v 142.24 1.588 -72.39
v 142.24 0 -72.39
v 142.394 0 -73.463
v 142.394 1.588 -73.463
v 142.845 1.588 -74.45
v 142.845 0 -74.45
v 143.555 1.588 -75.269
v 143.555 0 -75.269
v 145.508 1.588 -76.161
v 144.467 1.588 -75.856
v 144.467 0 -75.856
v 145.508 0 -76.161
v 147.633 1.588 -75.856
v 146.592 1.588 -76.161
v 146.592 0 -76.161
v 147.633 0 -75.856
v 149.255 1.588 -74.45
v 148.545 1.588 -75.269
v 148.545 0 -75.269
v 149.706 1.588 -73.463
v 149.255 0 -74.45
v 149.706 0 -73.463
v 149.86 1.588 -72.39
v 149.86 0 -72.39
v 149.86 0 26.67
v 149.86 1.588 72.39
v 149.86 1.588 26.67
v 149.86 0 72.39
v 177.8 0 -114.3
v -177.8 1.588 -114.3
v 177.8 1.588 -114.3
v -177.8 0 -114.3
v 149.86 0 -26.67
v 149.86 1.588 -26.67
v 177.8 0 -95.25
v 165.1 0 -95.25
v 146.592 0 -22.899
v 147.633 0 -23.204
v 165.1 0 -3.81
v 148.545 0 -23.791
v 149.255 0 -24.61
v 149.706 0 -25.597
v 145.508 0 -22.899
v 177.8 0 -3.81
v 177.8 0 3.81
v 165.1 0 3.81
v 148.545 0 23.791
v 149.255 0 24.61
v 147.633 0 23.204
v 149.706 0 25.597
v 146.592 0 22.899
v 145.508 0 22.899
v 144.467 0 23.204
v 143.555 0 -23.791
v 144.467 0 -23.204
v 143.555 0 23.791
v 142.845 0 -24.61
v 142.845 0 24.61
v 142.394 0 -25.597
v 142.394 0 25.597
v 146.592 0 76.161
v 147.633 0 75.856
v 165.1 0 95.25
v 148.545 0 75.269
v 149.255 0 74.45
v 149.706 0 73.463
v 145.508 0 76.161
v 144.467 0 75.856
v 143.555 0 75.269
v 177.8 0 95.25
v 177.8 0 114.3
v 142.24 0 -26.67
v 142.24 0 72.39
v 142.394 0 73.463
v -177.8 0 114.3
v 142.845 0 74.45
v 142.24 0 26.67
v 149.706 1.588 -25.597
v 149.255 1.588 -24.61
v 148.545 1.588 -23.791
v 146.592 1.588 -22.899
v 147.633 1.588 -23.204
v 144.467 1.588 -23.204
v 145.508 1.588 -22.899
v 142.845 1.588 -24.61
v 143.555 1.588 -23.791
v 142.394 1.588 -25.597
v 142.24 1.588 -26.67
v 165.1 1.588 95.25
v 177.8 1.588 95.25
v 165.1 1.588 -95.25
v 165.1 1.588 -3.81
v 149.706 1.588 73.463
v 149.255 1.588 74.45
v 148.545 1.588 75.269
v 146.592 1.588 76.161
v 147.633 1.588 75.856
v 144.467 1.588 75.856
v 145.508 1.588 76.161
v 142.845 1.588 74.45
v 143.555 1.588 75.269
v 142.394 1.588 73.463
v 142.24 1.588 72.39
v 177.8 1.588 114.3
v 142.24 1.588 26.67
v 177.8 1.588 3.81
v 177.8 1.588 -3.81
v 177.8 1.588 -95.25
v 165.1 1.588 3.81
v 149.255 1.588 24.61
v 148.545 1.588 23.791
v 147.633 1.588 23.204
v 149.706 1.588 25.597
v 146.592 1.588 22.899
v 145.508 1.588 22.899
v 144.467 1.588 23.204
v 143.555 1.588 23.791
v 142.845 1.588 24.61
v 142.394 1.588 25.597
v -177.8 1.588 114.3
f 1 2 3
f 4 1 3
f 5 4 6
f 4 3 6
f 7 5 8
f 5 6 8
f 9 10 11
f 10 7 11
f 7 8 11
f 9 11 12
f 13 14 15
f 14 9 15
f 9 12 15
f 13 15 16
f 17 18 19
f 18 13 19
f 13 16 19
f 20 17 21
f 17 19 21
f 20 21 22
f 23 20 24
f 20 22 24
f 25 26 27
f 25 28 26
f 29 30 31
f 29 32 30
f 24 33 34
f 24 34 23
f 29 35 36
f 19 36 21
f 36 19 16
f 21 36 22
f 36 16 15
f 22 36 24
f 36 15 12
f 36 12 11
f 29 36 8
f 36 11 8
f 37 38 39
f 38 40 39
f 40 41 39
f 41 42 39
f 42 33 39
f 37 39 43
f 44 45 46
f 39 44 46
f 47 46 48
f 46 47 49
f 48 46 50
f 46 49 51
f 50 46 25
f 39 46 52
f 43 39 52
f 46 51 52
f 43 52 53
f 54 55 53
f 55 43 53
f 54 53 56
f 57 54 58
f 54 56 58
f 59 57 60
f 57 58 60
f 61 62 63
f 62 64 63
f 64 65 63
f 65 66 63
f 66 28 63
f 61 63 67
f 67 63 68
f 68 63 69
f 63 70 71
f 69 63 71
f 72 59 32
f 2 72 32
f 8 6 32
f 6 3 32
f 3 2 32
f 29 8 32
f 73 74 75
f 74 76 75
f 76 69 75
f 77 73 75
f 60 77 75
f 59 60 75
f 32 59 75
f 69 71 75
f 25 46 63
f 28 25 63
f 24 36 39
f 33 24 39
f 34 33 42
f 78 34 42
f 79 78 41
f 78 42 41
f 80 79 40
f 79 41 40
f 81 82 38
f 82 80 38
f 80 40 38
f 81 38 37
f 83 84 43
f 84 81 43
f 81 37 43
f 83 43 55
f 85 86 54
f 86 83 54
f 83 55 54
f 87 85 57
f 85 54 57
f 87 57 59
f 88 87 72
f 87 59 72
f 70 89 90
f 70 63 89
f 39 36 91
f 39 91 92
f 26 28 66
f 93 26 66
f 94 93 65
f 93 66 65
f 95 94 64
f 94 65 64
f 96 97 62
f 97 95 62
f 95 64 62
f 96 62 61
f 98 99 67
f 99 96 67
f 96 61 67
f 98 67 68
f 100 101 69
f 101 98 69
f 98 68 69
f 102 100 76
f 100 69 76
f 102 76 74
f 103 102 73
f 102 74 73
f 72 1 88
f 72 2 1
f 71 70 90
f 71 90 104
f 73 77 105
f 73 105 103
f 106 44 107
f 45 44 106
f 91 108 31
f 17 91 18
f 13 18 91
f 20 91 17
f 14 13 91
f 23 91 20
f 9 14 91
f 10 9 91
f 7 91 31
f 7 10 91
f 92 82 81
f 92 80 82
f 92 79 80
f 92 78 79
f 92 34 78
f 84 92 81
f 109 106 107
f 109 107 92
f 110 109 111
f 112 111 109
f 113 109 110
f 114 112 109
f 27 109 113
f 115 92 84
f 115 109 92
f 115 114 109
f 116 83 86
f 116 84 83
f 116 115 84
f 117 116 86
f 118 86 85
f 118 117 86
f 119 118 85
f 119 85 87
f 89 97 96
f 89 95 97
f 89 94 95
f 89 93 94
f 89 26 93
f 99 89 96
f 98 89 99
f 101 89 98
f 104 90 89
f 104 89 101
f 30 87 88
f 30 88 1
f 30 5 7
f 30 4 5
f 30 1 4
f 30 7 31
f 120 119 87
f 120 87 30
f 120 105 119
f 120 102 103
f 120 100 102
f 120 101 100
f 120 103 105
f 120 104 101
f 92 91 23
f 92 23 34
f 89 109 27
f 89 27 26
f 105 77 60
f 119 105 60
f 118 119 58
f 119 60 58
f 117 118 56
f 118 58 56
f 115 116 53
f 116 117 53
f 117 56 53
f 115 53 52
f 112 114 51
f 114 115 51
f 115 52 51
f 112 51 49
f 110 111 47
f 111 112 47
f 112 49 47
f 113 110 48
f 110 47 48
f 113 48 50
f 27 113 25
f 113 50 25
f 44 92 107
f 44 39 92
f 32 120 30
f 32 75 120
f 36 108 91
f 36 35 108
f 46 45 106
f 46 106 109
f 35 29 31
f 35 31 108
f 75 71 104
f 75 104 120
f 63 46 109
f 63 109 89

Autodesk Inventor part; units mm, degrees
ref_plane "YZ Plane" through (0, 0, 0) normal (1, 0, 0) x (0, 1, 0)
ref_plane "XZ Plane" through (0, 0, 0) normal (0, 1, 0) x (-1, 0, 0)
ref_plane "XY Plane" through (0, 0, 0) normal (0, 0, 1) x (1, 0, 0)
sketch "Sketch1" plane through (0, 0, 0) normal (0, 1, 0) x (-1, 0, 0)
  line L0 (-177.8, 114.3) -> (177.8, 114.3)
  line L1 (177.8, 114.3) -> (177.8, -114.3)
  line L2 (177.8, -114.3) -> (-177.8, -114.3)
  line L3 (-177.8, -114.3) -> (-177.8, 114.3)
  line L4 (-177.8, 114.3) -> (177.8, -114.3) construction
  line L5 (177.8, 114.3) -> (-177.8, -114.3) construction
  line L6 (-165.1, 95.25) -> (-177.8, 95.25)
  line L7 (-177.8, 95.25) -> (-177.8, 3.81)
  line L8 (-177.8, 3.81) -> (-165.1, 3.81)
  line L9 (-165.1, 3.81) -> (-165.1, 95.25)
  line L10 (-165.1, -3.81) -> (-177.8, -3.81)
  line L11 (-177.8, -3.81) -> (-177.8, -95.25)
  line L12 (-177.8, -95.25) -> (-165.1, -95.25)
  line L13 (-165.1, -95.25) -> (-165.1, -3.81)
  line L14 (-146.05, 72.39) -> (-146.05, 26.67) construction
  line L15 (-149.86, 72.39) -> (-149.86, 26.67)
  line L16 (-142.24, 26.67) -> (-142.24, 72.39)
  arc A0 (-142.24, 72.39) -> (-149.86, 72.39) centre (-146.05, 72.39) ccw
  arc A1 (-149.86, 26.67) -> (-142.24, 26.67) centre (-146.05, 26.67) ccw
  line L17 (-146.05, -26.67) -> (-146.05, -72.39) construction
  line L18 (-149.86, -26.67) -> (-149.86, -72.39)
  line L19 (-142.24, -72.39) -> (-142.24, -26.67)
  arc A2 (-142.24, -26.67) -> (-149.86, -26.67) centre (-146.05, -26.67) ccw
  arc A3 (-149.86, -72.39) -> (-142.24, -72.39) centre (-146.05, -72.39) ccw
  point P0 (0, 0)
  point P1 (-146.05, 49.53)
  point P2 (-146.05, -49.53)
  point P3 (-177.8, 3.81)
  dimension "d0" = 355.6
  dimension "d1" = 228.6
  dimension "d2" = 12.7
  dimension "d3" = 91.44
  dimension "d4" = 91.44
  dimension "d5" = 12.7
  dimension "d6" = 19.05
  dimension "d7" = 19.05
  dimension "d8" = 45.72
  dimension "d9" = 7.62
  dimension "d10" = 45.72
  dimension "d11" = 7.62
  dimension "d12" = 41.91
  dimension "d13" = 19.05
  dimension "d14" = 19.05
  dimension "d15" = 41.91
extrude "Extrusion1" add sketch "Sketch1" along normal blind 1.5875 contours L0 L1 L2 L3 L12 L13 L10 L8 L9 L6
properties part number "EBox Door" material "Aluminum 6061"
